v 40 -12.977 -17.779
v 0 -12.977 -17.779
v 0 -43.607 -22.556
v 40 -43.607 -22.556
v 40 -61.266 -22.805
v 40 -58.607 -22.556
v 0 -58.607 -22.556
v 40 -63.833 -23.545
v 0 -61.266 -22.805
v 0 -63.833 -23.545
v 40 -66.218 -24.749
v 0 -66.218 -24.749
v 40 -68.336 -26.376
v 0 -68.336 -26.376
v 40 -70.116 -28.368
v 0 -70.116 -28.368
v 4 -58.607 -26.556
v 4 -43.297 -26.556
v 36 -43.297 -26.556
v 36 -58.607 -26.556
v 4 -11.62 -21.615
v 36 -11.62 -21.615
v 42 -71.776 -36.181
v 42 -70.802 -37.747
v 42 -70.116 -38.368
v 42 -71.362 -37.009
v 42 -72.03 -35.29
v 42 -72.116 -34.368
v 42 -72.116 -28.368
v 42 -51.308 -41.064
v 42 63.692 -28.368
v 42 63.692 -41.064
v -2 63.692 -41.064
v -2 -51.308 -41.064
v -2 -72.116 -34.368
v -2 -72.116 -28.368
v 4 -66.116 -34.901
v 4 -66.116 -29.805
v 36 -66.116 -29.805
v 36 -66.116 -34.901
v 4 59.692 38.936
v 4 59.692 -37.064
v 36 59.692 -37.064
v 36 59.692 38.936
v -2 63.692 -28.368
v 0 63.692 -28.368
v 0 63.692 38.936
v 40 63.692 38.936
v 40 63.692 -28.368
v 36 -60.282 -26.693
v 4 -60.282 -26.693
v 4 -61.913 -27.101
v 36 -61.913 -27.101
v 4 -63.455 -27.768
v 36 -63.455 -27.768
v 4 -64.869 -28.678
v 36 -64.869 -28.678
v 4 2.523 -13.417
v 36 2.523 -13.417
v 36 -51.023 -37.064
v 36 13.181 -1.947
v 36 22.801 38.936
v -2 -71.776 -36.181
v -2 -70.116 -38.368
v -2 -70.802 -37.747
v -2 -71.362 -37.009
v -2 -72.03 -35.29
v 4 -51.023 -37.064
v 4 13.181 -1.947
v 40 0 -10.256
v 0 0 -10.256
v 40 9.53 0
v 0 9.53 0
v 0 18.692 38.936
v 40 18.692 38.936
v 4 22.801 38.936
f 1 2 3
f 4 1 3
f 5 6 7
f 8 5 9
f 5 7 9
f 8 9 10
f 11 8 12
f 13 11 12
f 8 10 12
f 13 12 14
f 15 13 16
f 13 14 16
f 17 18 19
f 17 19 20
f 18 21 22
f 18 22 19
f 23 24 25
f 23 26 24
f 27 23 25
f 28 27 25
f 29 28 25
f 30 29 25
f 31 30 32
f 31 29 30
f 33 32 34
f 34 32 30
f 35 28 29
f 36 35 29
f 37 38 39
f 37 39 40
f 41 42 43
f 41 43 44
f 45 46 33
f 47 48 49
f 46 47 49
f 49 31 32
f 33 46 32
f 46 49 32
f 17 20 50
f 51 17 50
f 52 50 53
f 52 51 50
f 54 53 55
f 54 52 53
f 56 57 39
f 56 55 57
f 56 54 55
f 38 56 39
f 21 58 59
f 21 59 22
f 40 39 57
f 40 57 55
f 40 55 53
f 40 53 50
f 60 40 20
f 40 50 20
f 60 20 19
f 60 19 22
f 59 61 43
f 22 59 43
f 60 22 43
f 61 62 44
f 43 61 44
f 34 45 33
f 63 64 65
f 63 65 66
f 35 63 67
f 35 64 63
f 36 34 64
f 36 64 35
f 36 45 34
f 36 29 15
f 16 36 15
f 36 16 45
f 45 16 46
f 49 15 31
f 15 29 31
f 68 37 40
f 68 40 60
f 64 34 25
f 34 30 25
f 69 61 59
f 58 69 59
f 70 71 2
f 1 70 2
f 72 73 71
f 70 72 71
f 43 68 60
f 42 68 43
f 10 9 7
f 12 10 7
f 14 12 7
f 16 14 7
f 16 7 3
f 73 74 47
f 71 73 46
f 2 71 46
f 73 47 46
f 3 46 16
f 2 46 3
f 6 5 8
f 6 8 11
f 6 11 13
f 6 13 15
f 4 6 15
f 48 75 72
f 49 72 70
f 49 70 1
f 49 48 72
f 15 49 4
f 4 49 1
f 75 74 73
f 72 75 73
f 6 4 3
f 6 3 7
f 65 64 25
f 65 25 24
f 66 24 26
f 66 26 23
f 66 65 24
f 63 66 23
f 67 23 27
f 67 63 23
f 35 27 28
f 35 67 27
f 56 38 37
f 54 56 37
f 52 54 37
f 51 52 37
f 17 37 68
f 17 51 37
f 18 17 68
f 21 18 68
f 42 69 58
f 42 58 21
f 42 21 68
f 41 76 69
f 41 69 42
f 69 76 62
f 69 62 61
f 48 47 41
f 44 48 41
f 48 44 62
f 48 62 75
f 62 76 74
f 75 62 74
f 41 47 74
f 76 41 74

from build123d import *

# Parameters (mm, degrees)
F0_R        = 11
F0_R_2      = 8.5
F1_DEPTH    = 40
F2_T        = -4
F3_DEPTH    = 2
F5_DEPTH    = 2
F7_DEPTH    = 2
F8_T1_DEPTH = 64


# Not quite as in the source:
# - a fillet or chamfer that OpenCascade refuses, or shapes differently, is made with other operations: its cross-section is extruded or revolved along the edge and cut away or added


with BuildPart() as f1:
    # F0 (on Right) → F1 (new body)
    with BuildSketch(Plane.YZ):
        with BuildLine():
            Line((63.6921661989, -31.096493093), (63.6921661989, 38.9364992437))
            Line((63.6921661989, 38.9364992437), (18.6921661989, 38.9364992437))
            Line((18.6921661989, 38.9364992437), (9.5297960554, 0))
            Line((9.5297960554, 0), (0, -10.2558757374))
            Line((0, -10.2558757374), (-12.9771592787, -17.7787300531))
            Line((-12.9771592787, -17.7787300531), (-43.6068768529, -22.555800424))
            Line((-43.6068768529, -22.555800424), (-58.6068768529, -22.555800424))
            ThreePointArc((-58.6068768529, -22.555800424), (-65.0535615803, -24.0913867663), (-70.115709102, -28.3683520288))
            Line((-70.115709102, -28.3683520288), (-51.312591107, -31.096493093))
            Line((-51.312591107, -31.096493093), (63.6921661989, -31.096493093))
        make_face()
        with Locations((47.8400811553, 10.7847582549)):
            Circle(F0_R, mode=Mode.SUBTRACT)
        Polygon((63.6921661989, -41.0635007563), (63.6921661989, -31.096493093), (-51.312591107, -31.096493093), (-70.115709102, -28.3683520288), (-70.115709102, -38.3683520288), (-51.3078338011, -41.0635007563), align=None)
        with Locations((47.8400811553, 10.7847582549)):
            Circle(F0_R)
        with Locations((47.8400811553, 10.7847582549)):
            Circle(F0_R_2, mode=Mode.SUBTRACT)
        with Locations((47.8400811553, 10.7847582549)):
            Circle(F0_R_2)
    extrude(amount=F1_DEPTH)

    # F2
    f2_openings = [f1.faces().sort_by_distance(p)[0] for p in [
        (20, 41.192166, 38.936499),
    ]]
    offset(amount=F2_T, openings=f2_openings, kind=Kind.INTERSECTION)

    # F3 (add): a face of the model
    f3_faces = [f1.faces().sort_by_distance(p)[0] for p in [
        (20, -70.115709102, -33.3683520288),
    ]]
    extrude(f3_faces, amount=F3_DEPTH)

    # F4 (on face) → F5 (join)
    with BuildSketch(Plane.YZ.offset(40)):
        Polygon((63.6921661989, -28.3683520288), (-70.115709102, -28.3683520288), (-72.115709102, -28.3683520288), (-72.115709102, -38.3683520288), (-70.115709102, -38.3683520288), (-51.3078338011, -41.0635007563), (63.6921661989, -41.0635007563), align=None)
    extrude(amount=F5_DEPTH)

    # F6 (on face) → F7 (join)
    with BuildSketch(Plane(origin=(0, 0, 0), x_dir=(0, -1, 0), z_dir=(-1, 0, 0))):
        Polygon((72.115709102, -28.3683520288), (70.115709102, -28.3683520288), (-63.6921661989, -28.3683520288), (-63.6921661989, -41.0635007563), (51.3078338011, -41.0635007563), (70.115709102, -38.3683520288), (72.115709102, -38.3683520288), align=None)
    extrude(amount=F7_DEPTH)

    # F8: fillet of radius 5 on 1 edges, made by hand

    # F8_s2 → F8_t1 (cut)
    with BuildSketch(Plane.YZ.offset(-12)):
        with BuildLine():
            ThreePointArc((-70.115709102, -38.3683520288), (-71.587845057, -36.6044200063), (-72.115709102, -34.3683520288))
            Line((-72.115709102, -34.3683520288), (-72.115709102, -38.3683520288))
            Line((-72.115709102, -38.3683520288), (-70.115709102, -38.3683520288))
        make_face()
    extrude(amount=F8_T1_DEPTH, mode=Mode.SUBTRACT)


solid = f1.part
